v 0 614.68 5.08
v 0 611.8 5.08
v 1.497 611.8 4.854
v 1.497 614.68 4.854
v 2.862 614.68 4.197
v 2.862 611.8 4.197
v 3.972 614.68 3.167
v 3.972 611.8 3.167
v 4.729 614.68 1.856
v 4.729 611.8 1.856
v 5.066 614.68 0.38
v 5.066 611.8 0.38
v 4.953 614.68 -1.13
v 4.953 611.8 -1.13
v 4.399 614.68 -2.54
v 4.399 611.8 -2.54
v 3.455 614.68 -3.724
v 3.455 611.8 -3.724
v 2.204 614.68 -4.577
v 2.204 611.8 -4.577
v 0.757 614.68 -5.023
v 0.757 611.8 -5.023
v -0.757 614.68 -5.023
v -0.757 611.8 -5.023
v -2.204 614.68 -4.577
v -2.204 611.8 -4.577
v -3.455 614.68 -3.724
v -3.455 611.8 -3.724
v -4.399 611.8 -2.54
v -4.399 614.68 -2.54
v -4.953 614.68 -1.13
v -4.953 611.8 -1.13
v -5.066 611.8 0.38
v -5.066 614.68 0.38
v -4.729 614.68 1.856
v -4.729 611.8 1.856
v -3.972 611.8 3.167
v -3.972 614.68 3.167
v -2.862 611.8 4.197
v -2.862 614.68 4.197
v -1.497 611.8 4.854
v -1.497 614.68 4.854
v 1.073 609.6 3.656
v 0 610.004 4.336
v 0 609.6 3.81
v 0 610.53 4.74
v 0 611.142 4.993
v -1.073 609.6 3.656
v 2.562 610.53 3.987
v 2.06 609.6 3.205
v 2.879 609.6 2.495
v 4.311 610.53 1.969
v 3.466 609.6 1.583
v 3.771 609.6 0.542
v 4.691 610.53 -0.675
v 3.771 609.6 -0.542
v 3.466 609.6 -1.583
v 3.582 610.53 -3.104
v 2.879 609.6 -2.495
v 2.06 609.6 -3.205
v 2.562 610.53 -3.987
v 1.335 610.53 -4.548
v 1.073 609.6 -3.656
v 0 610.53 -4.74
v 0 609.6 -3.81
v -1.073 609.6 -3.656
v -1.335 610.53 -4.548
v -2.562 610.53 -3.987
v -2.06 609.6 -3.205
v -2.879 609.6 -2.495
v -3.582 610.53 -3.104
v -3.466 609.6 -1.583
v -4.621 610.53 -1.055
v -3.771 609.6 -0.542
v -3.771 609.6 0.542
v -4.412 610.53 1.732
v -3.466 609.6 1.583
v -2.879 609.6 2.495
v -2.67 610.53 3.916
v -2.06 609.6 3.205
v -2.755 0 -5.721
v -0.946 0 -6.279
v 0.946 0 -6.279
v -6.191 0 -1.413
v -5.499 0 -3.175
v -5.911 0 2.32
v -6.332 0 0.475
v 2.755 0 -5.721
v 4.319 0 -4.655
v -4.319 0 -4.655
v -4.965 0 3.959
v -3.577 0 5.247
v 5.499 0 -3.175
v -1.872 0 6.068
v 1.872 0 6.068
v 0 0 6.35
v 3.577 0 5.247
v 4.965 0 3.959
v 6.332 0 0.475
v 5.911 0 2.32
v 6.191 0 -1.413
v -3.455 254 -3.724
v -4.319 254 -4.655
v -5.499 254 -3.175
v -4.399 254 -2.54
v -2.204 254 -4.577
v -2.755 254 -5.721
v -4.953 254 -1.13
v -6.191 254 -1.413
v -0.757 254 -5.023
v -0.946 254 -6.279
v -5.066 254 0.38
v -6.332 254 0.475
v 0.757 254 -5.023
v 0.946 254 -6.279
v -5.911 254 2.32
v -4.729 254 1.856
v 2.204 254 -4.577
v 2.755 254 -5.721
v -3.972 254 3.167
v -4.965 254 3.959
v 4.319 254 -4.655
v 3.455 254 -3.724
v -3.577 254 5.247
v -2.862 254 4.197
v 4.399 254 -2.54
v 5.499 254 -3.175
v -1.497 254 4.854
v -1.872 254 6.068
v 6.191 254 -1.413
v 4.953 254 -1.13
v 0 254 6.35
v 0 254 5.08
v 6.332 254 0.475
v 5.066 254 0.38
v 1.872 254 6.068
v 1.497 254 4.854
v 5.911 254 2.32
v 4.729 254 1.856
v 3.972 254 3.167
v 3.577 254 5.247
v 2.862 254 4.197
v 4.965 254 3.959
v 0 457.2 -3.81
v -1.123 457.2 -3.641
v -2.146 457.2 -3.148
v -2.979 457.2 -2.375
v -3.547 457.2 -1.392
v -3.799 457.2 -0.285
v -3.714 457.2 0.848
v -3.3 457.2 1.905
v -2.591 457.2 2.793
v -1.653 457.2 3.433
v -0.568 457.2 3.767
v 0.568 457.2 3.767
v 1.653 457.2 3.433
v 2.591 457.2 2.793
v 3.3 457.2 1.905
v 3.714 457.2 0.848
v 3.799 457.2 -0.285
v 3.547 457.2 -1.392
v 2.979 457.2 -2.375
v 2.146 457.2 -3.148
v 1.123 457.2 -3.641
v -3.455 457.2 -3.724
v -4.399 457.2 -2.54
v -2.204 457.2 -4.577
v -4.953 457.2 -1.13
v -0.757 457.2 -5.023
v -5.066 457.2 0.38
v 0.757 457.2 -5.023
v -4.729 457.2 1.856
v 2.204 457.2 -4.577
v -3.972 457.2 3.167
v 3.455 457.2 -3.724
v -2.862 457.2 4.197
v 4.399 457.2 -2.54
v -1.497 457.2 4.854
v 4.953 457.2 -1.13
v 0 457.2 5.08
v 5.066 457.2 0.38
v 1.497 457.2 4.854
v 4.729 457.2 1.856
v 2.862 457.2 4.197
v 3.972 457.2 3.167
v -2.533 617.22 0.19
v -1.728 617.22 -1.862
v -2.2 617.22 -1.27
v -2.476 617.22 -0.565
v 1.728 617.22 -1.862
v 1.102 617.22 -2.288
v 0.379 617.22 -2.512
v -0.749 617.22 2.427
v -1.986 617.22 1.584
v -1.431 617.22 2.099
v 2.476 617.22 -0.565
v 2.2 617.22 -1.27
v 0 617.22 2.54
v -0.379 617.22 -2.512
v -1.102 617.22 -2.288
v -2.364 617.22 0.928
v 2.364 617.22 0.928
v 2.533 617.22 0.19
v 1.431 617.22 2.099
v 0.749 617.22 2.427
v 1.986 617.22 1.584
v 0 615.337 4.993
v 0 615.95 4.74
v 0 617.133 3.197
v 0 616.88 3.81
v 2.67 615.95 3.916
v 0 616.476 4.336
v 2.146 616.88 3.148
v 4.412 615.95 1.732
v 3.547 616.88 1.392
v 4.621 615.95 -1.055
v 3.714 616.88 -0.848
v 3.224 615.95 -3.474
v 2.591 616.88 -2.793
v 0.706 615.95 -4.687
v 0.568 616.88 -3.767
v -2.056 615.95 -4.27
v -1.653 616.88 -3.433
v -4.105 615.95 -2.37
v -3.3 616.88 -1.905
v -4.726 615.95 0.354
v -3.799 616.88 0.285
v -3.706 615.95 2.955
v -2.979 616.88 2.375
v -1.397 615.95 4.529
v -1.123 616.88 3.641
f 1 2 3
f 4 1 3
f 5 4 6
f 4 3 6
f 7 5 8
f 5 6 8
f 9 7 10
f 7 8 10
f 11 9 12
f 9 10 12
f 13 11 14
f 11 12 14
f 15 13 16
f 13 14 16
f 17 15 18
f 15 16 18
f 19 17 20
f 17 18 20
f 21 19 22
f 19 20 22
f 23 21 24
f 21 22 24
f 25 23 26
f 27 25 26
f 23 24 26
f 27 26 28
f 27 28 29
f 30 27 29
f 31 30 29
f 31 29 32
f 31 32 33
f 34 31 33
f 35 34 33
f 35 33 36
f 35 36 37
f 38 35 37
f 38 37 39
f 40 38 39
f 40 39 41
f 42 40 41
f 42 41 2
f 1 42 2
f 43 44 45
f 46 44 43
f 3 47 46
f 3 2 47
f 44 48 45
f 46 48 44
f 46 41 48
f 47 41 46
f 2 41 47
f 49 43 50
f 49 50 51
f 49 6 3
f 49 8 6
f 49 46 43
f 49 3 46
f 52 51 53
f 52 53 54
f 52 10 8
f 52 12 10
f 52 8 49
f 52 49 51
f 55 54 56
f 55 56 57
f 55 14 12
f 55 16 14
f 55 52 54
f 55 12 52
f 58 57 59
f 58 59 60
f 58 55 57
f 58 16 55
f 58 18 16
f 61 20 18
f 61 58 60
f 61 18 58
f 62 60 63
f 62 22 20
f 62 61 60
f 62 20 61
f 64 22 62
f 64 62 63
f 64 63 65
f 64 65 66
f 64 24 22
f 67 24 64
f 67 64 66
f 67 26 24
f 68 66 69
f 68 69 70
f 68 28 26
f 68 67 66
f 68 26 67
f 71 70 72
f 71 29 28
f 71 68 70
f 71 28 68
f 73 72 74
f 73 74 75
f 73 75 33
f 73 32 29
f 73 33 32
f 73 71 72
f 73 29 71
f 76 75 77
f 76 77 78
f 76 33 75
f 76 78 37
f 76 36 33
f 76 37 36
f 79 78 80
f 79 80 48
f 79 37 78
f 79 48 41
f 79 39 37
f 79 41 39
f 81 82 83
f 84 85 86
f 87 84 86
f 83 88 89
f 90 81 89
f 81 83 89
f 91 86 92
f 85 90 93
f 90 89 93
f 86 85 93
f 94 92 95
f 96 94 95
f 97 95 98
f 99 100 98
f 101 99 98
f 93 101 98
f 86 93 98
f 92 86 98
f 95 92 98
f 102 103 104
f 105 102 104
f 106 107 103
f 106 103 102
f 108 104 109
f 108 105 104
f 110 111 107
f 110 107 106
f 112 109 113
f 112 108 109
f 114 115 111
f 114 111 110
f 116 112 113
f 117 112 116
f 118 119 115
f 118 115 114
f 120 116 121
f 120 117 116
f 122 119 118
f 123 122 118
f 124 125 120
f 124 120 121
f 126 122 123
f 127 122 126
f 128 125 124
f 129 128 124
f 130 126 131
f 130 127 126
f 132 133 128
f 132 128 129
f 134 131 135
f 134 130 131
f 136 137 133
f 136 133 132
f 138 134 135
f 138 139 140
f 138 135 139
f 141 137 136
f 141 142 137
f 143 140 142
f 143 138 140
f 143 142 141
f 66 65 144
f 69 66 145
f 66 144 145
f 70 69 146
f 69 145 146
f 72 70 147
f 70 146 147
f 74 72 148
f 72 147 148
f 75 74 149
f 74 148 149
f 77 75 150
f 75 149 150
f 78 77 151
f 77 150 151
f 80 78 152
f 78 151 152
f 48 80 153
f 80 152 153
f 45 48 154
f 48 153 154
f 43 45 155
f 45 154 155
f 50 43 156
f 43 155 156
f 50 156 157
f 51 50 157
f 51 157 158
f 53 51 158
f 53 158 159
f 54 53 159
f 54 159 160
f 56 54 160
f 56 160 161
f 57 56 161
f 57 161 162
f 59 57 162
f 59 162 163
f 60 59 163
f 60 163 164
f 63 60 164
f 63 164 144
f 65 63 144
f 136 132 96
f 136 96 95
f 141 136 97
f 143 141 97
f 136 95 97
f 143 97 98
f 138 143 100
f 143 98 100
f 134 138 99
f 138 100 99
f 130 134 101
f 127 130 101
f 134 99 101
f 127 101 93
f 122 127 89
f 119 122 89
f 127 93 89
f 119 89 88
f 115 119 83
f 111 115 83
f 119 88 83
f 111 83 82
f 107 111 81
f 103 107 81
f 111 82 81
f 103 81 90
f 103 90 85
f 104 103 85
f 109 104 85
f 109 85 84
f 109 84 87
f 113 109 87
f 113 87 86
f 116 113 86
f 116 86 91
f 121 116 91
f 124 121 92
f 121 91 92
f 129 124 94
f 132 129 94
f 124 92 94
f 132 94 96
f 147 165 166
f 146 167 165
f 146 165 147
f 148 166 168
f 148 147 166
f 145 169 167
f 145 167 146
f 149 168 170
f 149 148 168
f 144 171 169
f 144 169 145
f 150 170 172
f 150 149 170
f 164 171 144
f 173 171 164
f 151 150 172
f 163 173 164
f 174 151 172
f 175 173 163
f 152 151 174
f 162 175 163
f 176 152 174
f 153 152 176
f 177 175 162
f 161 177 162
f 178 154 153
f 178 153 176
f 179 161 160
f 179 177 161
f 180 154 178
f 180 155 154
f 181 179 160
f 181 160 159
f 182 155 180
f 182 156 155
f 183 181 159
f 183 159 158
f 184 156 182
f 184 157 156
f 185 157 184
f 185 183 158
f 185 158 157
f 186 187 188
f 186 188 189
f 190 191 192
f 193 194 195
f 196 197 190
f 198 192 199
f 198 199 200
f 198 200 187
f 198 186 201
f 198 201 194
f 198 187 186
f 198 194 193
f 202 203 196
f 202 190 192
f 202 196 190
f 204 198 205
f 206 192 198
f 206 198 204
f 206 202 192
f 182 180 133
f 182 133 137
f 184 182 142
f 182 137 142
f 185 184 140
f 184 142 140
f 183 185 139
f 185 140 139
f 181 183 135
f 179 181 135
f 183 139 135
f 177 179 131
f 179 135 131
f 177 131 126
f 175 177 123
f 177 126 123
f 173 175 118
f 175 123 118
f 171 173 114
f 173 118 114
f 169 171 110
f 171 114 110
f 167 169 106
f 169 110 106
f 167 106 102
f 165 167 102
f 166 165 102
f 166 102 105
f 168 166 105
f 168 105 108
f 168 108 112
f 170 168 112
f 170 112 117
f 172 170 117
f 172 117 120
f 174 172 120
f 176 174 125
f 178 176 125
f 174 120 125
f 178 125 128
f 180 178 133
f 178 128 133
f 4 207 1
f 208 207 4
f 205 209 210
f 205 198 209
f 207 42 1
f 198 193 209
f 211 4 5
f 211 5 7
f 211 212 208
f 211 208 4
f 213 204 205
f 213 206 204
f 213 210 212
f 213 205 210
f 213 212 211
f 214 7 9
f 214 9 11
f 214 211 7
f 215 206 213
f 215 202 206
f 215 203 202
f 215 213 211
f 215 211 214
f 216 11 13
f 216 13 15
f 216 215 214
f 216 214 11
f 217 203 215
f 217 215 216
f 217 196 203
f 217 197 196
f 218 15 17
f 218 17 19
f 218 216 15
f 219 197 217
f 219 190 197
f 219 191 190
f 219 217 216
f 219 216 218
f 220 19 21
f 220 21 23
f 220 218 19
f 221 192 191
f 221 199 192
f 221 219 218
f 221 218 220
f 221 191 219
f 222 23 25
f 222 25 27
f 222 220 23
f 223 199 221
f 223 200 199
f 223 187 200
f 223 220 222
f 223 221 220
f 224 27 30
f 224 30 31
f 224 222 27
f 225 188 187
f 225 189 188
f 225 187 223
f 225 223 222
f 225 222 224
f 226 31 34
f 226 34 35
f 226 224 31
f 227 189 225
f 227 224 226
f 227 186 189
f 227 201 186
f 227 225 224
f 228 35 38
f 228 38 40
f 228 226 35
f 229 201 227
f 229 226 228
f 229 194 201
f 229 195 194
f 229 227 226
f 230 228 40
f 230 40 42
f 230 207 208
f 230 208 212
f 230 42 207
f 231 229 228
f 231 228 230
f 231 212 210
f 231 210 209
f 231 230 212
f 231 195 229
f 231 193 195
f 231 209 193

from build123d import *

# Parameters (mm, degrees)
SKETCH1_R           = 6.35
BOSS_EXTRUDE1_DEPTH = 254
SKETCH2_R           = 5.08
BOSS_EXTRUDE2_DEPTH = 203.2
SKETCH3_R           = 3.81
BOSS_EXTRUDE3_DEPTH = 152.4
SKETCH4_R           = 5.08
BOSS_EXTRUDE4_DEPTH = 7.62
FILLET1_R           = 2.54


with BuildPart() as part:
    # Sketch1 → Boss-Extrude1 (new body)
    with BuildSketch(Plane(origin=(0, 0, 0), x_dir=(1, 0, 0), z_dir=(0, 1, 0))):
        with Locations(Location((0, 0, 0), (0, 0, 270))):
            Circle(SKETCH1_R)
    extrude(amount=BOSS_EXTRUDE1_DEPTH)

    # Sketch2 → Boss-Extrude2 (add)
    with BuildSketch(Plane(origin=(0, 254, 0), x_dir=(1, 0, 0), z_dir=(0, 1, 0))):
        with Locations(Location((0, 0, 0), (0, 0, 270))):
            Circle(SKETCH2_R)
    extrude(amount=BOSS_EXTRUDE2_DEPTH)

    # Sketch3 → Boss-Extrude3 (add)
    with BuildSketch(Plane(origin=(0, 457.2, 0), x_dir=(1, 0, 0), z_dir=(0, 1, 0))):
        with Locations(Location((0, 0, 0), (0, 0, 90))):
            Circle(SKETCH3_R)
    extrude(amount=BOSS_EXTRUDE3_DEPTH)

    # Sketch4 → Boss-Extrude4 (add)
    with BuildSketch(Plane(origin=(0, 609.6, 0), x_dir=(1, 0, 0), z_dir=(0, 1, 0))):
        with Locations(Location((0, 0, 0), (0, 0, 270))):
            Circle(SKETCH4_R)
    extrude(amount=BOSS_EXTRUDE4_DEPTH)

    # Fillet1
    # the kernel refuses this fillet: 2.54 mm, written as the material it takes off along each edge
    with BuildSketch(Plane(origin=(0, 609.6, 0), x_dir=(0, 0, 1), z_dir=(-1, 0, 0))) as fillet1_piece_1:
        with BuildLine():
            CenterArc((2.54, 2.199704526), FILLET1_R, 300, 60)
            Line((3.81, 0), (3.8354, -0.043994091))
            ThreePointArc((3.8354, -0.043994091), (4.445, -0.0508), (5.08, -0.0508))
            Line((5.08, -0.0508), (5.1308, 0))
            Line((5.1308, 0), (5.1308, 2.199704526))
            Line((5.1308, 2.199704526), (5.08, 2.199704526))
        make_face()
    revolve(axis=Axis((0, 609.6, 0), (0, 1, 0)), mode=Mode.SUBTRACT)
    with BuildSketch(Plane(origin=(0, 617.22, 0), x_dir=(0, 0, 1), z_dir=(-1, 0, 0))) as fillet1_piece_2:
        with BuildLine():
            CenterArc((5.08 - FILLET1_R, -FILLET1_R), FILLET1_R, 0, 90)
            Line((5.08 - FILLET1_R, 0), (5.08 - FILLET1_R, FILLET1_R * 0.02))
            Line((5.08 - FILLET1_R, FILLET1_R * 0.02), (5.08 + FILLET1_R * 0.02, FILLET1_R * 0.02))
            Line((5.08 + FILLET1_R * 0.02, FILLET1_R * 0.02), (5.08 + FILLET1_R * 0.02, -FILLET1_R))
            Line((5.08 + FILLET1_R * 0.02, -FILLET1_R), (5.08, -FILLET1_R))
        make_face()
    revolve(axis=Axis((0, 617.22, 0), (0, 1, 0)), mode=Mode.SUBTRACT)


solid = part.part
